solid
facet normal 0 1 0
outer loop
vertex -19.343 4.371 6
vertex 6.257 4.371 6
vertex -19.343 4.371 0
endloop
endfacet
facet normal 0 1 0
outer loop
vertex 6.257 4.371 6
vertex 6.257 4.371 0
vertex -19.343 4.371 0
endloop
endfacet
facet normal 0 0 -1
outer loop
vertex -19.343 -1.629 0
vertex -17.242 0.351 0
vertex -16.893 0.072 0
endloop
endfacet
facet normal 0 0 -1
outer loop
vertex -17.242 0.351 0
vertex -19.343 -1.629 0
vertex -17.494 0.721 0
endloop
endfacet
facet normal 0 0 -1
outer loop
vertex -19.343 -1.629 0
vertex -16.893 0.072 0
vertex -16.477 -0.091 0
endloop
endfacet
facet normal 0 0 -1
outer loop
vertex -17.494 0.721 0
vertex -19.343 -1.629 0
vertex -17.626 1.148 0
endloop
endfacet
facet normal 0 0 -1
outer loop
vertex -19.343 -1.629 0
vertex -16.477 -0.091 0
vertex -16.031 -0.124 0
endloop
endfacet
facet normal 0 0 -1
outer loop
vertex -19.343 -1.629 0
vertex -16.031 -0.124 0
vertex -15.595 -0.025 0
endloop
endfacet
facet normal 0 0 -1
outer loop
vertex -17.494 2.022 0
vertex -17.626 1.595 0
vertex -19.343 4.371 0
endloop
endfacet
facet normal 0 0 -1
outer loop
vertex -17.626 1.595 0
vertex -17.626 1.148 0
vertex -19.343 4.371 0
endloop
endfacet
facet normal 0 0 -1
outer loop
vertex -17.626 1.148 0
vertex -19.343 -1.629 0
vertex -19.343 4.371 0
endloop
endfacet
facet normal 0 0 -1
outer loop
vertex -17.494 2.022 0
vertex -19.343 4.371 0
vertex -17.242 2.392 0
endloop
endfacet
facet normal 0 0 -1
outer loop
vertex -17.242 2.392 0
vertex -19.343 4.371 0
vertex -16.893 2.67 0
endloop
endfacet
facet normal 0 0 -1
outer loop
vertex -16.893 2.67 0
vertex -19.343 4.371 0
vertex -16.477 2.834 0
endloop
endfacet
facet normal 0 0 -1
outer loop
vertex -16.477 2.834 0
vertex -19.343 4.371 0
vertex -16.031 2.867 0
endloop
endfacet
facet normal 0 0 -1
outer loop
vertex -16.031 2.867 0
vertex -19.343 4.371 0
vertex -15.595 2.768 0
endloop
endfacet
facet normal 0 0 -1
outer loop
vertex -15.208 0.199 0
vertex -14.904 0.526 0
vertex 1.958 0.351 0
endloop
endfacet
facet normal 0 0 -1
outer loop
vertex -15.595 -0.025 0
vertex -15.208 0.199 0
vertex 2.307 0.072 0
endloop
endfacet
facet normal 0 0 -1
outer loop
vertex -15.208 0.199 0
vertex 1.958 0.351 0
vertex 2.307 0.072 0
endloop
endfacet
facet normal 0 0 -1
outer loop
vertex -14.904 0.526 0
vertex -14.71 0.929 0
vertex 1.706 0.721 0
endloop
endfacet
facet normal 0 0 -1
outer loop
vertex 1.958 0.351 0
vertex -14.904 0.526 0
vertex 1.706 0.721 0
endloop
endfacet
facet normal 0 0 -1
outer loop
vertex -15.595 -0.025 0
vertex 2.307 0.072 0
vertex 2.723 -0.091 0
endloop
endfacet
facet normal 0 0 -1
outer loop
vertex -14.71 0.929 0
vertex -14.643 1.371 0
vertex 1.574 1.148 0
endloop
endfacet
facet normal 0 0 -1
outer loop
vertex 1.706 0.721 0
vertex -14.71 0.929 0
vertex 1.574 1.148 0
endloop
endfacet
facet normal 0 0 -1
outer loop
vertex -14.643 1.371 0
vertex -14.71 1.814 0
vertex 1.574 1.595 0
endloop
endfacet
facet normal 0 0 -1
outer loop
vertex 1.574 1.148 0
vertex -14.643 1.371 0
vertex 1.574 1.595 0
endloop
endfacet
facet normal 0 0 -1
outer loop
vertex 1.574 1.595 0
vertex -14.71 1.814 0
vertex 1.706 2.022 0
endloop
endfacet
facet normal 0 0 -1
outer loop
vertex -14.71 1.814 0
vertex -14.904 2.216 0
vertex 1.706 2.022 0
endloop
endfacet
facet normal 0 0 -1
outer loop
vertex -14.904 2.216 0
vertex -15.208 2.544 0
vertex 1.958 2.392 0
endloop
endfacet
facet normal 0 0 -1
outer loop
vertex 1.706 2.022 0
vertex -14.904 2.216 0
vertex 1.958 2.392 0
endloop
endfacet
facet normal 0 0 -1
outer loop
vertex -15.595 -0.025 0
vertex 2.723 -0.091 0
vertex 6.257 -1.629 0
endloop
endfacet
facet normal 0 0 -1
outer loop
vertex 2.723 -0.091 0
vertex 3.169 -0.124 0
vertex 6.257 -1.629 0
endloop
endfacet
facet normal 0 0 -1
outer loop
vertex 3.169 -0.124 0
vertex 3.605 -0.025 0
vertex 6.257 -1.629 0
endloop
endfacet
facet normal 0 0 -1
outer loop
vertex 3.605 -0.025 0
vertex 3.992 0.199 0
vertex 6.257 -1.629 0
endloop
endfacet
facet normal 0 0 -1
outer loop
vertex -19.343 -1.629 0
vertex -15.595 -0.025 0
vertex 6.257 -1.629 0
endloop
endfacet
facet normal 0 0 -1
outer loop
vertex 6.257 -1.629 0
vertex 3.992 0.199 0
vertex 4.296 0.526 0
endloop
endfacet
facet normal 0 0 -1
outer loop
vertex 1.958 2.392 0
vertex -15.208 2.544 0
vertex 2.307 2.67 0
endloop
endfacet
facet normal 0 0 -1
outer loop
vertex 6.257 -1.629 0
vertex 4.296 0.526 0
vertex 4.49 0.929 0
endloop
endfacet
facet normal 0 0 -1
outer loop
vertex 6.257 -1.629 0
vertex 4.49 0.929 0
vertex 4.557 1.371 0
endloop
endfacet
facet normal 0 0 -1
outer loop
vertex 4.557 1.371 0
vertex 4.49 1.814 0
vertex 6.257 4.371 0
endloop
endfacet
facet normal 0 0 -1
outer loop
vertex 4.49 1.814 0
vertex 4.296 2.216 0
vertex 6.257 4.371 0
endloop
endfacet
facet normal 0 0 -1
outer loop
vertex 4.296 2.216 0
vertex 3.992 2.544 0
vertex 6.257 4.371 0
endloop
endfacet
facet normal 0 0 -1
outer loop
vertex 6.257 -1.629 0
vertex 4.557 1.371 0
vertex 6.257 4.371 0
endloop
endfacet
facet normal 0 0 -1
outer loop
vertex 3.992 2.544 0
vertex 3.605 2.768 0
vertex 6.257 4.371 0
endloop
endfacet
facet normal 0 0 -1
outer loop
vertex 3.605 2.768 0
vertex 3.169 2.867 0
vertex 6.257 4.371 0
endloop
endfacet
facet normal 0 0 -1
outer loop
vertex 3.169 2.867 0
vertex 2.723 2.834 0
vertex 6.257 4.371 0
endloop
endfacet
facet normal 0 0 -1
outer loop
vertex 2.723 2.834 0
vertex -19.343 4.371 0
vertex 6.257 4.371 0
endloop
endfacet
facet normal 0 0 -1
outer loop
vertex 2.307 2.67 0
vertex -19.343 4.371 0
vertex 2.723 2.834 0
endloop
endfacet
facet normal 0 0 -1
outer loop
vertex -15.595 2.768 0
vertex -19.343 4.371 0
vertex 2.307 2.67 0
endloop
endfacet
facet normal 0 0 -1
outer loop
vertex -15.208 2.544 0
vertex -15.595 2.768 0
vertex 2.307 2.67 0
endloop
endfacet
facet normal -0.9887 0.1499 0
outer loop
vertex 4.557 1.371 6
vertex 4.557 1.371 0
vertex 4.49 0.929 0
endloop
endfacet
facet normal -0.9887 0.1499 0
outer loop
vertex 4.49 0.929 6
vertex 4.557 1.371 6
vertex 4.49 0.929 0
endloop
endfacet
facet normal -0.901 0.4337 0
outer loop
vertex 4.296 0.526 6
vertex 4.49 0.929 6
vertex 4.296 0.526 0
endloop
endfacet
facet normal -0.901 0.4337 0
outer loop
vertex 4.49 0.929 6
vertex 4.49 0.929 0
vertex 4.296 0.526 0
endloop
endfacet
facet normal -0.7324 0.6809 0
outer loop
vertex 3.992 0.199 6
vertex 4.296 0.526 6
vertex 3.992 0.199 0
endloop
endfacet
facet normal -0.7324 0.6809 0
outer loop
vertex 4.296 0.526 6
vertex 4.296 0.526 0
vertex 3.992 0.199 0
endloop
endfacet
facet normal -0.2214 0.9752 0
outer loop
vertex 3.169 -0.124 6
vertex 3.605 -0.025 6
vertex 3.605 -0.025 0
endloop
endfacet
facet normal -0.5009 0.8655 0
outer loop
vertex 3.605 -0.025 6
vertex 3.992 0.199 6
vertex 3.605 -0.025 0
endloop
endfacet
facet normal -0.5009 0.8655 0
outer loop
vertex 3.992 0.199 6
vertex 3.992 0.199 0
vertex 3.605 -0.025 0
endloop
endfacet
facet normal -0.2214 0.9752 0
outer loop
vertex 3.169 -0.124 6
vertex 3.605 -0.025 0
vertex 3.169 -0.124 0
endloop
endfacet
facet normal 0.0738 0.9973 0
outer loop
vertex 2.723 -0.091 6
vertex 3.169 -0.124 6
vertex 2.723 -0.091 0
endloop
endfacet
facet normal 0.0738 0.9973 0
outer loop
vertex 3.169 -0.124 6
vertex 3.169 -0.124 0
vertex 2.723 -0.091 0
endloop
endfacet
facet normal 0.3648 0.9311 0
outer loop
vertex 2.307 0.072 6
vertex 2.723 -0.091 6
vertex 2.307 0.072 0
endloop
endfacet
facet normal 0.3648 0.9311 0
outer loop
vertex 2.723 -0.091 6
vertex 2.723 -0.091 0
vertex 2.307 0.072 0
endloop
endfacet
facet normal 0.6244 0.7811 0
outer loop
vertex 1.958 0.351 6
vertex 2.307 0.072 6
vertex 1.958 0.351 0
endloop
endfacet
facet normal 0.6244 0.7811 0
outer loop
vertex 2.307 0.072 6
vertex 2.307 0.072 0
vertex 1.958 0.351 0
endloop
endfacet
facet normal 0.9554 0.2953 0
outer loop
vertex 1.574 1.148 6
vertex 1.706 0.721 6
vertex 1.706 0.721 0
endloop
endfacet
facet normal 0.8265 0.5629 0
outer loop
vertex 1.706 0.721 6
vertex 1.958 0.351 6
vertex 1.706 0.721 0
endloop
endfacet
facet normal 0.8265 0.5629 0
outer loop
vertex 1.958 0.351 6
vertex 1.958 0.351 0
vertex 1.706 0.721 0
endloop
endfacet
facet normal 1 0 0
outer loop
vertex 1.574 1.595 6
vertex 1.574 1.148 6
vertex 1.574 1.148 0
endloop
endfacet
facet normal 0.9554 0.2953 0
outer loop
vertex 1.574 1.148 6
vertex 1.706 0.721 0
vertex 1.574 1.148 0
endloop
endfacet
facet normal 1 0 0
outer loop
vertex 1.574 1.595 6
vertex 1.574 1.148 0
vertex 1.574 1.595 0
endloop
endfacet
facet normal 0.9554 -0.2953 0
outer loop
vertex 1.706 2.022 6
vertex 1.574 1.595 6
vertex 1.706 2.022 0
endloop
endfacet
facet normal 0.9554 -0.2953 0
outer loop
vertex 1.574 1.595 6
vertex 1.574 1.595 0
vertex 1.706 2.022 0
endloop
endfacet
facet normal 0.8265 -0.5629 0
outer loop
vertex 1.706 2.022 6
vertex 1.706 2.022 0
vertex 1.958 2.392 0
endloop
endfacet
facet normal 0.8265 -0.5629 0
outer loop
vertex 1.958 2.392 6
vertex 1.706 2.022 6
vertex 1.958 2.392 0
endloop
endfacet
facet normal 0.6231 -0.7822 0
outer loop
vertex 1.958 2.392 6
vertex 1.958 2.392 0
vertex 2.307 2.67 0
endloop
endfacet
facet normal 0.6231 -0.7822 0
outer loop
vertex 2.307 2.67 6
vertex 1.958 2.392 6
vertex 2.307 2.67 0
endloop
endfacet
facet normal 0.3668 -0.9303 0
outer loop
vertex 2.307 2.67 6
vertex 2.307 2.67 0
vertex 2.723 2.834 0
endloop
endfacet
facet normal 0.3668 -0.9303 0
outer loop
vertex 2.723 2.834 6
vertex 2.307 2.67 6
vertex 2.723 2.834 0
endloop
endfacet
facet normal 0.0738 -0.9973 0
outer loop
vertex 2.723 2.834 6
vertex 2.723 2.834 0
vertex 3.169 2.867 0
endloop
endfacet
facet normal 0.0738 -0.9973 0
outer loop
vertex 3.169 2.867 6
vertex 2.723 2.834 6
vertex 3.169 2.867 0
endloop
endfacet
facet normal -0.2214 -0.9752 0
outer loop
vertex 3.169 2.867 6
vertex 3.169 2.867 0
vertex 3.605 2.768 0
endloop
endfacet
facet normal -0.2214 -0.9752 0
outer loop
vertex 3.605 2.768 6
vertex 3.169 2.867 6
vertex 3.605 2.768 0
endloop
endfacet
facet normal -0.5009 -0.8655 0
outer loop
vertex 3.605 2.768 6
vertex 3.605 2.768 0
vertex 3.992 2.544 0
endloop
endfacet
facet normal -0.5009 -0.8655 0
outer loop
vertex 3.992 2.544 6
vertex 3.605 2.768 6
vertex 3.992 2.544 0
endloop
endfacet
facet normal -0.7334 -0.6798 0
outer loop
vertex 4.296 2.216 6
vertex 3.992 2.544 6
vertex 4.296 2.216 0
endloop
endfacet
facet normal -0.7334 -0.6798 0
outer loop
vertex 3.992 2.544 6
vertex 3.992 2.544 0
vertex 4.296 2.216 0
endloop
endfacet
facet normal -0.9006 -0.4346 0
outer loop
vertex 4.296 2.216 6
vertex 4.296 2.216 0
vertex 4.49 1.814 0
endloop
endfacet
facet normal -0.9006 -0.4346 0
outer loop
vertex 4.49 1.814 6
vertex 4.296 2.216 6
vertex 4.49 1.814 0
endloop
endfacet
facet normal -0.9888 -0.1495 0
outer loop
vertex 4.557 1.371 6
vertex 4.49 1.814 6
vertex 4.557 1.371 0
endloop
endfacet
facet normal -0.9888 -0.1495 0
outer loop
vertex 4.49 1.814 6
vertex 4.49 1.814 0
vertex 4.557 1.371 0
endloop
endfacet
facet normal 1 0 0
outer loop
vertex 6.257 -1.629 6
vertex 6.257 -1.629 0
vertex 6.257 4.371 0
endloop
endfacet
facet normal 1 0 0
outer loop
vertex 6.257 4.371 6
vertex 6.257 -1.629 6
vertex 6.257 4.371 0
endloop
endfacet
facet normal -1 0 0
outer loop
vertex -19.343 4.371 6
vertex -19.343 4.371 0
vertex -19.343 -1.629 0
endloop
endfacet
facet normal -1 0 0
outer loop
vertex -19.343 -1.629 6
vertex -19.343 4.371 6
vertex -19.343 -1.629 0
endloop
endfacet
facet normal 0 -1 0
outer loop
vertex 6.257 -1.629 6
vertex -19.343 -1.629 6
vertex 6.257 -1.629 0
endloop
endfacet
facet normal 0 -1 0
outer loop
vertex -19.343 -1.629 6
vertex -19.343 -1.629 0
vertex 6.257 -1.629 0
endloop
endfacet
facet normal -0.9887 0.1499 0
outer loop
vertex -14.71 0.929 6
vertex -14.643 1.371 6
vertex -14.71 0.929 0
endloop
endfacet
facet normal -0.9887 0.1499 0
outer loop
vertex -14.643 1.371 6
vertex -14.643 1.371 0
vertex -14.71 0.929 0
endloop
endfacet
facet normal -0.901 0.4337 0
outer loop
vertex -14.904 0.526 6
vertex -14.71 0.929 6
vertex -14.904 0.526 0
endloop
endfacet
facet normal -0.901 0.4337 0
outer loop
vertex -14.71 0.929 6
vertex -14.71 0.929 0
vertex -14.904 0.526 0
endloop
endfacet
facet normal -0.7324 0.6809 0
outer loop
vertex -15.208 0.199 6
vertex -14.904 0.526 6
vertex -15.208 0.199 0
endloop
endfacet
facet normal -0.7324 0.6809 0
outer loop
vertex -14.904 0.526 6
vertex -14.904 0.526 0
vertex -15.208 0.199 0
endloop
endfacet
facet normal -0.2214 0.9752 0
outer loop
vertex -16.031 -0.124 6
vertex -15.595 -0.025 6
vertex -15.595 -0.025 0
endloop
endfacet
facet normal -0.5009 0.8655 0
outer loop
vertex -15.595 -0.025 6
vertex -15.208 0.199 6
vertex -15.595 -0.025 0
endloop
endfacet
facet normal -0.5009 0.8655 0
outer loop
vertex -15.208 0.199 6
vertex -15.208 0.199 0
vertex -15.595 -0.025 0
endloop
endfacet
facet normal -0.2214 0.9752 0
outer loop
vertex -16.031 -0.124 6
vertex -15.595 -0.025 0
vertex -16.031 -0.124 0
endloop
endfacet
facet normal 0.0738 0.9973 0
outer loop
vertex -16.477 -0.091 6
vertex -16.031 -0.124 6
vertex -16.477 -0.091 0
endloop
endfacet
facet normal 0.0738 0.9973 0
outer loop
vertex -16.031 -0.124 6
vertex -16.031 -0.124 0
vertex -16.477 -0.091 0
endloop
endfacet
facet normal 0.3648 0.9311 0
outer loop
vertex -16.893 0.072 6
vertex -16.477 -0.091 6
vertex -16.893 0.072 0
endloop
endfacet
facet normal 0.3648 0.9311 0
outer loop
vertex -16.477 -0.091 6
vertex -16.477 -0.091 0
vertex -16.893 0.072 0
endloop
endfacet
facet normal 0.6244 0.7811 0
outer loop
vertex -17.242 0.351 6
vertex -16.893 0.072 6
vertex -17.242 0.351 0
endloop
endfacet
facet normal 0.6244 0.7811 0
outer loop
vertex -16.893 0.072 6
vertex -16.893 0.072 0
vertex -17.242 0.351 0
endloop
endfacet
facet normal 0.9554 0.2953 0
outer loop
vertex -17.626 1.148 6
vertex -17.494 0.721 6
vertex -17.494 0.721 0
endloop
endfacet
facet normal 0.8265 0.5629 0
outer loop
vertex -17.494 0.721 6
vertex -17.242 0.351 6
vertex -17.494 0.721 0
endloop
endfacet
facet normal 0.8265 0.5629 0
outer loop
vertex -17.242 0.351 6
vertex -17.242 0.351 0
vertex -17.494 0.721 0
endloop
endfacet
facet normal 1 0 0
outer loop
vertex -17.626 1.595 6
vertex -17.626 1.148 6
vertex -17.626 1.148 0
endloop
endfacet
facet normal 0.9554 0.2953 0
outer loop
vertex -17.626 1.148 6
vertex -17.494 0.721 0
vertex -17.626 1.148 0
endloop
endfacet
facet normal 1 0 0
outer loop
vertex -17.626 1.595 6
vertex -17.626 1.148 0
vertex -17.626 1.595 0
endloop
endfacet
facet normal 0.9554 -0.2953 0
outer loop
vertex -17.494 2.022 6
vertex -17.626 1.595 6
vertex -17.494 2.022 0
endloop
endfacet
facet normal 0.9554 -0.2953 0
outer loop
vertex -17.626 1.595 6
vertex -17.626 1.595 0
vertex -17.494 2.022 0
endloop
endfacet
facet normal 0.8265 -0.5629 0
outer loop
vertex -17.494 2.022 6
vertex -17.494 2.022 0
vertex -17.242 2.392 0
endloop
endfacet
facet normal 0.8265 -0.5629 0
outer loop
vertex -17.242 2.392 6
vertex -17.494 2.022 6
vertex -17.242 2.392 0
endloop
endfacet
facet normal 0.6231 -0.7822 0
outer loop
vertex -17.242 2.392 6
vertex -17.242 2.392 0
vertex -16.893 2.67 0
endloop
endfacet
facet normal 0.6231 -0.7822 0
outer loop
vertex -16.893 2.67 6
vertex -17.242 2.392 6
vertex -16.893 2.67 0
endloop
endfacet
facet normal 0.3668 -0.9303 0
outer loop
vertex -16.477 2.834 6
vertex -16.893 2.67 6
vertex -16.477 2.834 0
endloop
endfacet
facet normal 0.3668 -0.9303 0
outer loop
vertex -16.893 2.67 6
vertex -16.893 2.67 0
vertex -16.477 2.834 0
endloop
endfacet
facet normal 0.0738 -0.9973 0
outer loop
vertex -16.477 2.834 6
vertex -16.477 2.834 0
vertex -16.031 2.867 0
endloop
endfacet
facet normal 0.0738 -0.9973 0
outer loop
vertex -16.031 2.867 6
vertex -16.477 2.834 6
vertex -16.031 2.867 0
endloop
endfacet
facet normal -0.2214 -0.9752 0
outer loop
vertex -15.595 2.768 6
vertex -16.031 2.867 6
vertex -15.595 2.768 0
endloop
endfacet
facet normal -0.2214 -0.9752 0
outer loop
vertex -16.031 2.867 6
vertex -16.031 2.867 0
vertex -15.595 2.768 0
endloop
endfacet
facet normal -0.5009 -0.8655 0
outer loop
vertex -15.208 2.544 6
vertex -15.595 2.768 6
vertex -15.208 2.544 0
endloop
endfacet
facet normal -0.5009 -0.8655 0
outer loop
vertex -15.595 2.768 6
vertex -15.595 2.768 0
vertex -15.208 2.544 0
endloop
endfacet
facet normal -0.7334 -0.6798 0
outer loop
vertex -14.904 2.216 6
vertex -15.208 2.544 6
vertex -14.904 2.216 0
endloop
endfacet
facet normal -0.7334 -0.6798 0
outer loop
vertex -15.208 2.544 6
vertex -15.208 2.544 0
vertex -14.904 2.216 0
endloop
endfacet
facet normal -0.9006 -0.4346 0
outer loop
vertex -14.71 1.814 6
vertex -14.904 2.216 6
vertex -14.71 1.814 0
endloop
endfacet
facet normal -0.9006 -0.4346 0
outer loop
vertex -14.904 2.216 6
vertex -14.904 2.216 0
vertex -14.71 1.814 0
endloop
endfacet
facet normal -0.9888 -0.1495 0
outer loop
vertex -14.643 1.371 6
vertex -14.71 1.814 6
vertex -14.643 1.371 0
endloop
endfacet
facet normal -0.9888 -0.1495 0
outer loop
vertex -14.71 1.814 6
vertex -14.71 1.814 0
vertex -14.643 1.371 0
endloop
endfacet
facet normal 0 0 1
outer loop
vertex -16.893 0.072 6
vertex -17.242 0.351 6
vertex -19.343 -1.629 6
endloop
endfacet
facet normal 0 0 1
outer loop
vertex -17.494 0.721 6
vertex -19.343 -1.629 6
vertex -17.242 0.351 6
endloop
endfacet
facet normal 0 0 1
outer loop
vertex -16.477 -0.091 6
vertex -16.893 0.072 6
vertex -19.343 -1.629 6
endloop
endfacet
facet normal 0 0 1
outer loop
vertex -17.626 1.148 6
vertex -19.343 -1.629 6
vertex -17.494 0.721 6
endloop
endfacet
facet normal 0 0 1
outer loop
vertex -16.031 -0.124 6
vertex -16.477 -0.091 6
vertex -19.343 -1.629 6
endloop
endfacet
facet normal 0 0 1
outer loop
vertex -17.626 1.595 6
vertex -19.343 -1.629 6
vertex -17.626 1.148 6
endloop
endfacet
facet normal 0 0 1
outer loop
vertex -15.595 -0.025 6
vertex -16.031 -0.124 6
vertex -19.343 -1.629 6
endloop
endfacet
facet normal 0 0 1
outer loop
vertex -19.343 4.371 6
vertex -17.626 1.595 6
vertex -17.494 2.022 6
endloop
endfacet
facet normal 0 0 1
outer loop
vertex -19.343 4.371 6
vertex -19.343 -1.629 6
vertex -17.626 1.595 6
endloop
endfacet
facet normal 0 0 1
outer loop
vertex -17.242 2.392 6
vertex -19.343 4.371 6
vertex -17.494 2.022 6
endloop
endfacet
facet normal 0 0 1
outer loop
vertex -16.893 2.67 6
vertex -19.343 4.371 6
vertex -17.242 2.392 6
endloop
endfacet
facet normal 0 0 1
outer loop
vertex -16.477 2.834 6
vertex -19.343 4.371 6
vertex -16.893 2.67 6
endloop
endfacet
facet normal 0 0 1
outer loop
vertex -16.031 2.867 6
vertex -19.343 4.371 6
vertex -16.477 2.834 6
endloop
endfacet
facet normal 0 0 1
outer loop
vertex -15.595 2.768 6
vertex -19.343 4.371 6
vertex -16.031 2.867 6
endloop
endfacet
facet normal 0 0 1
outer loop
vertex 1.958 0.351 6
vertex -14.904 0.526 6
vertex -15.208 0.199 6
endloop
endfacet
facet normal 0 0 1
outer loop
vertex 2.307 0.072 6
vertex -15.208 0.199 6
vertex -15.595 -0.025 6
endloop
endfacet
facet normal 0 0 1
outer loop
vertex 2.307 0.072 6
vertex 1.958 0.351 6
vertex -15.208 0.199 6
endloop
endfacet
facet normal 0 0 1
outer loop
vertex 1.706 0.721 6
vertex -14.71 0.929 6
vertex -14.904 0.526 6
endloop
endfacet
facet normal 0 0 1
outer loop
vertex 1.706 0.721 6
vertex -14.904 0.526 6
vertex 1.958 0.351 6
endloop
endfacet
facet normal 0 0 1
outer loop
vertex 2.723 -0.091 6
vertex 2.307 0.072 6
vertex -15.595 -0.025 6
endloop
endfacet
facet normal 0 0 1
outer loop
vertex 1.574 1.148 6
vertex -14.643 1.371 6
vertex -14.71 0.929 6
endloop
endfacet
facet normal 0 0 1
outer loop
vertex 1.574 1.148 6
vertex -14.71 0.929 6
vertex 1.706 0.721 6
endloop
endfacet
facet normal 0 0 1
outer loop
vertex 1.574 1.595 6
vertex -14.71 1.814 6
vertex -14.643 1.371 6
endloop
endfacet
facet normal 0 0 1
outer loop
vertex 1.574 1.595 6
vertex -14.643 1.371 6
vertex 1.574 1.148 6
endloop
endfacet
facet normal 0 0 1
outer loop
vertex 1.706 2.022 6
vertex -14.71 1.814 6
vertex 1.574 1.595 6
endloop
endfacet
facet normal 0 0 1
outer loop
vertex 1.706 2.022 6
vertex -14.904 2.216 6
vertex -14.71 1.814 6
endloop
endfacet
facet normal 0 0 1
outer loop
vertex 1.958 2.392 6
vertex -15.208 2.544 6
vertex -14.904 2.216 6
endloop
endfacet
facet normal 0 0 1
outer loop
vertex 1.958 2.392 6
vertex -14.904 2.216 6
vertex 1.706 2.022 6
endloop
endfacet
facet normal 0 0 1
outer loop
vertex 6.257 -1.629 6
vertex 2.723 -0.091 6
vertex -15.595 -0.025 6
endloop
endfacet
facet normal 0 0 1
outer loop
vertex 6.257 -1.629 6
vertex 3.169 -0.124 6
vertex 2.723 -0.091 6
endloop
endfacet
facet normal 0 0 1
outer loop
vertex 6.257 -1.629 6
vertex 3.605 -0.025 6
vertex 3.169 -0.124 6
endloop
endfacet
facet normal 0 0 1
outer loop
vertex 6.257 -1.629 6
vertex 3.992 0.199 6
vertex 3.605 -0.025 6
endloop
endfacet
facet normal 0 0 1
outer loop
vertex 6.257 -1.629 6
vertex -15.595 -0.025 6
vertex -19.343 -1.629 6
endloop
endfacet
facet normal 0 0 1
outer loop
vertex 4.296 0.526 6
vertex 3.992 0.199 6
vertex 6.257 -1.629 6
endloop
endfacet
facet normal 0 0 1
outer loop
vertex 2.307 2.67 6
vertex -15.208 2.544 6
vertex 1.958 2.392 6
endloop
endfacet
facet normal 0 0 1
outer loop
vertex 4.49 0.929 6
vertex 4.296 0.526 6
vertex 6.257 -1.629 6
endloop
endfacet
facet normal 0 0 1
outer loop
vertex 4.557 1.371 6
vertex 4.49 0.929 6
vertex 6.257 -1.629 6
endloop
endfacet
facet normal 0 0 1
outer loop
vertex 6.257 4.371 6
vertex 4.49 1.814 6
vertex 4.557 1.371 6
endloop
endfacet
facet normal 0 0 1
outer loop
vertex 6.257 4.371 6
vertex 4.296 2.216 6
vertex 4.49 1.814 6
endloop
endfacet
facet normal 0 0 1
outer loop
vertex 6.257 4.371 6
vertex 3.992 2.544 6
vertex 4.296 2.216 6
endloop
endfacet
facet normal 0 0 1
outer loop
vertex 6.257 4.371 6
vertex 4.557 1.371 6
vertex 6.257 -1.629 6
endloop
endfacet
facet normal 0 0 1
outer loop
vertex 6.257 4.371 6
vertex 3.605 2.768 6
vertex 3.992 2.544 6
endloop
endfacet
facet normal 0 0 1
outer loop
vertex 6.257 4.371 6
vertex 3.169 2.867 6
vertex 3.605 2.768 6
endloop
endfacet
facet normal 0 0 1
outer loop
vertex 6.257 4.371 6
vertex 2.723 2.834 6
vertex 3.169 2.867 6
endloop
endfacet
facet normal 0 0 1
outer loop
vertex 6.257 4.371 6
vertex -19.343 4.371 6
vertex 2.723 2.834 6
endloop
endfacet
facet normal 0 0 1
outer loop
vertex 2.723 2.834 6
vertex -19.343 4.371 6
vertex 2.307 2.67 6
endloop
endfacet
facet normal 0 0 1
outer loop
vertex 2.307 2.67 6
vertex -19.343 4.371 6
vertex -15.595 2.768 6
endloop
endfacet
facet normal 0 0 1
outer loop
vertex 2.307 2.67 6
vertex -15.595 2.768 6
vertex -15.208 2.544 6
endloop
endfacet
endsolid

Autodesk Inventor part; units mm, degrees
ref_plane "YZ Plane" through (0, 0, 0) normal (1, 0, 0) x (0, 1, 0)
ref_plane "XZ Plane" through (0, 0, 0) normal (0, 1, 0) x (-1, 0, 0)
ref_plane "XY Plane" through (0, 0, 0) normal (0, 0, 1) x (1, 0, 0)
sketch "Sketch1" plane through (0, 0, 0) normal (0, 0, 1) x (1, 0, 0)
  circle A0 centre (-16.1429, 1.3714) radius 1.5
  circle A1 centre (3.0571, 1.3714) radius 1.5
  line L0 (6.2571, 4.3714) -> (-19.3429, 4.3714)
  line L1 (-19.3429, 4.3714) -> (-19.3429, -1.6286)
  line L2 (-19.3429, -1.6286) -> (6.2571, -1.6286)
  line L3 (6.2571, -1.6286) -> (6.2571, 4.3714)
  point P0 (0, 0)
  point P1 (0, 0)
extrude "Extrusion1" add sketch "Sketch1" along normal blind 6
properties part number "yCarBeltTensioner"
